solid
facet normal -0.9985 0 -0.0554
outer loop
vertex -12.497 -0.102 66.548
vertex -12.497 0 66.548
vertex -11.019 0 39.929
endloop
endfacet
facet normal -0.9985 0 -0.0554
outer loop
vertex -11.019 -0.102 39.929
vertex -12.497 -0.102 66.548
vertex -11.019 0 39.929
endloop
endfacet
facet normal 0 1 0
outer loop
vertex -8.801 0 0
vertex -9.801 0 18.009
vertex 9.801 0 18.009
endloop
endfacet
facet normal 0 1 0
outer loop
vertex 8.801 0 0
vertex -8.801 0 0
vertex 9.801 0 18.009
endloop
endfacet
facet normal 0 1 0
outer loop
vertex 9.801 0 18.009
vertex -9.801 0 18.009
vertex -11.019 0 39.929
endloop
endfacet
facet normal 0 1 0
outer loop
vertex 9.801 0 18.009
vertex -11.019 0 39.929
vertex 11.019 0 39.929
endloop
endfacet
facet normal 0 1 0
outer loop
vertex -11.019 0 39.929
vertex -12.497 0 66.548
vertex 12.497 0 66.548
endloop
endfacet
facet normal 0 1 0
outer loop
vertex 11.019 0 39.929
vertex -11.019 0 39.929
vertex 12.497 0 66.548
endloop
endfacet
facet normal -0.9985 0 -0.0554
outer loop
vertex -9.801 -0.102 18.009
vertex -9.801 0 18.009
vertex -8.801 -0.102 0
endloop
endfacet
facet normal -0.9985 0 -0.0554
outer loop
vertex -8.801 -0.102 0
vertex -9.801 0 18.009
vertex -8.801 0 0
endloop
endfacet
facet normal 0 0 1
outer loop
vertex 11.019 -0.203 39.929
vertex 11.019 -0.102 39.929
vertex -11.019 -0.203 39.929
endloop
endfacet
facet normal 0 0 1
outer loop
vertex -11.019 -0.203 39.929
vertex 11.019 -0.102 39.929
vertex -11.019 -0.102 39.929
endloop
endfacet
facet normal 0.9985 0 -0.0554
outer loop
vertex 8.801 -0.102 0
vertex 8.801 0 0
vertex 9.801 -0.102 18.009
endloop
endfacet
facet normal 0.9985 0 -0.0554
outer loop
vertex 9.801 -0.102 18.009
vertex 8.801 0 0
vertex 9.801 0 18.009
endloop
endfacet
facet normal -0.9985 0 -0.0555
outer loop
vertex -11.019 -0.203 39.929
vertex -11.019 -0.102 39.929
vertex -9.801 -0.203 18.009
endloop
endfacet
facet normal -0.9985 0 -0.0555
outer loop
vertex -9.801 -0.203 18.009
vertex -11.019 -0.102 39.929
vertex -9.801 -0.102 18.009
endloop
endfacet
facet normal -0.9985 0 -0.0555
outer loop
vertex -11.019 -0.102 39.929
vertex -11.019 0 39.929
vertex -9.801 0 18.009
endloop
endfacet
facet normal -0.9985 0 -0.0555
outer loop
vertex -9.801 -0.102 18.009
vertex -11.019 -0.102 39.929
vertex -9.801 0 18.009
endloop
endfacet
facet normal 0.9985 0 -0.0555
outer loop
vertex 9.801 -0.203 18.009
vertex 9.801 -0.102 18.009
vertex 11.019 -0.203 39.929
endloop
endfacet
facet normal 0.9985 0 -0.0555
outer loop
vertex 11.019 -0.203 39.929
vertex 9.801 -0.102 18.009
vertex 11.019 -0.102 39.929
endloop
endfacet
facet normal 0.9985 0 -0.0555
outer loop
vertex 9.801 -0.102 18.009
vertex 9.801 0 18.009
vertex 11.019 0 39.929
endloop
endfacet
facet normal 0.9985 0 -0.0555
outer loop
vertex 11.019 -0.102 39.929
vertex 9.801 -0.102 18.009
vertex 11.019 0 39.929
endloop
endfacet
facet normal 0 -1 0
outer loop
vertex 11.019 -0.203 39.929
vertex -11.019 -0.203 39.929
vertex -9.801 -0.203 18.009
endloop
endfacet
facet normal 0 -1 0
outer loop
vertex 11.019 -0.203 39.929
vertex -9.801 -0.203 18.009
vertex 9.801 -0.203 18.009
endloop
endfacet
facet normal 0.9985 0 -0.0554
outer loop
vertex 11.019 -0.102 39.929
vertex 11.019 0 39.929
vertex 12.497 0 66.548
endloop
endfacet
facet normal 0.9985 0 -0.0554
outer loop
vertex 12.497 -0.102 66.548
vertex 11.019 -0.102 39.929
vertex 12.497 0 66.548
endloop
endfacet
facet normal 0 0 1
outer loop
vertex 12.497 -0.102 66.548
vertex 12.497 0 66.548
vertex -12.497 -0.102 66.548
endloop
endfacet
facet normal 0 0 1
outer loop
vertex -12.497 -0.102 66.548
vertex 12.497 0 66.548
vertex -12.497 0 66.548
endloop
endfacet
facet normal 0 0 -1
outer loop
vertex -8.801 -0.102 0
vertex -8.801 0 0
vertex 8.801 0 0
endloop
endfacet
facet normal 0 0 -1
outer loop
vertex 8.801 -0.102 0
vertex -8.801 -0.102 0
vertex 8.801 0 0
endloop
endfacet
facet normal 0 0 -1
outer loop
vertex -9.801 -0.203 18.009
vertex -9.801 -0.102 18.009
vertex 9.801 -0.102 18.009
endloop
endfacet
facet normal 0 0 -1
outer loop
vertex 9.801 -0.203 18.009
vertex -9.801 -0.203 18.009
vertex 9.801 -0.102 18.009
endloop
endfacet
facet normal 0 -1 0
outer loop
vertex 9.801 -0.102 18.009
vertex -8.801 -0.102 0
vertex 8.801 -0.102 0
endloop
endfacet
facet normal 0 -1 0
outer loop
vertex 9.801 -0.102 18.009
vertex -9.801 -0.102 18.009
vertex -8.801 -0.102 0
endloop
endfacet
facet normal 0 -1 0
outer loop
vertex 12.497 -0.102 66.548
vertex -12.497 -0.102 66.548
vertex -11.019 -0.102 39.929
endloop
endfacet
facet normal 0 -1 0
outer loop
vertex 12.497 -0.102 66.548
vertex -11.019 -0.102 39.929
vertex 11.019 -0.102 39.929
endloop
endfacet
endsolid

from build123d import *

# Parameters (mm, degrees)
F1_DEPTH = 0.2032
F2_DEPTH = 0.1016


with BuildPart() as f1:
    # F0 (on Front) → F1 (new body)
    with BuildSketch(Plane.XZ):
        Polygon((0, 18.0086), (9.801196, 18.0086), (11.01852, 39.9288), (0, 39.9288), (-11.01852, 39.9288), (-9.801196, 18.0086), align=None)
    extrude(amount=F1_DEPTH)

    # F0 (on Front) → F2 (join)
    with BuildSketch(Plane.XZ):
        Polygon((0, 39.9288), (11.01852, 39.9288), (12.4968, 66.548), (0, 66.548), (-12.4968, 66.548), (-11.01852, 39.9288), align=None)
        Polygon((-8.8011, 0), (0, 0), (8.8011, 0), (9.801196, 18.0086), (0, 18.0086), (-9.801196, 18.0086), align=None)
    extrude(amount=F2_DEPTH)


solid = f1.part
